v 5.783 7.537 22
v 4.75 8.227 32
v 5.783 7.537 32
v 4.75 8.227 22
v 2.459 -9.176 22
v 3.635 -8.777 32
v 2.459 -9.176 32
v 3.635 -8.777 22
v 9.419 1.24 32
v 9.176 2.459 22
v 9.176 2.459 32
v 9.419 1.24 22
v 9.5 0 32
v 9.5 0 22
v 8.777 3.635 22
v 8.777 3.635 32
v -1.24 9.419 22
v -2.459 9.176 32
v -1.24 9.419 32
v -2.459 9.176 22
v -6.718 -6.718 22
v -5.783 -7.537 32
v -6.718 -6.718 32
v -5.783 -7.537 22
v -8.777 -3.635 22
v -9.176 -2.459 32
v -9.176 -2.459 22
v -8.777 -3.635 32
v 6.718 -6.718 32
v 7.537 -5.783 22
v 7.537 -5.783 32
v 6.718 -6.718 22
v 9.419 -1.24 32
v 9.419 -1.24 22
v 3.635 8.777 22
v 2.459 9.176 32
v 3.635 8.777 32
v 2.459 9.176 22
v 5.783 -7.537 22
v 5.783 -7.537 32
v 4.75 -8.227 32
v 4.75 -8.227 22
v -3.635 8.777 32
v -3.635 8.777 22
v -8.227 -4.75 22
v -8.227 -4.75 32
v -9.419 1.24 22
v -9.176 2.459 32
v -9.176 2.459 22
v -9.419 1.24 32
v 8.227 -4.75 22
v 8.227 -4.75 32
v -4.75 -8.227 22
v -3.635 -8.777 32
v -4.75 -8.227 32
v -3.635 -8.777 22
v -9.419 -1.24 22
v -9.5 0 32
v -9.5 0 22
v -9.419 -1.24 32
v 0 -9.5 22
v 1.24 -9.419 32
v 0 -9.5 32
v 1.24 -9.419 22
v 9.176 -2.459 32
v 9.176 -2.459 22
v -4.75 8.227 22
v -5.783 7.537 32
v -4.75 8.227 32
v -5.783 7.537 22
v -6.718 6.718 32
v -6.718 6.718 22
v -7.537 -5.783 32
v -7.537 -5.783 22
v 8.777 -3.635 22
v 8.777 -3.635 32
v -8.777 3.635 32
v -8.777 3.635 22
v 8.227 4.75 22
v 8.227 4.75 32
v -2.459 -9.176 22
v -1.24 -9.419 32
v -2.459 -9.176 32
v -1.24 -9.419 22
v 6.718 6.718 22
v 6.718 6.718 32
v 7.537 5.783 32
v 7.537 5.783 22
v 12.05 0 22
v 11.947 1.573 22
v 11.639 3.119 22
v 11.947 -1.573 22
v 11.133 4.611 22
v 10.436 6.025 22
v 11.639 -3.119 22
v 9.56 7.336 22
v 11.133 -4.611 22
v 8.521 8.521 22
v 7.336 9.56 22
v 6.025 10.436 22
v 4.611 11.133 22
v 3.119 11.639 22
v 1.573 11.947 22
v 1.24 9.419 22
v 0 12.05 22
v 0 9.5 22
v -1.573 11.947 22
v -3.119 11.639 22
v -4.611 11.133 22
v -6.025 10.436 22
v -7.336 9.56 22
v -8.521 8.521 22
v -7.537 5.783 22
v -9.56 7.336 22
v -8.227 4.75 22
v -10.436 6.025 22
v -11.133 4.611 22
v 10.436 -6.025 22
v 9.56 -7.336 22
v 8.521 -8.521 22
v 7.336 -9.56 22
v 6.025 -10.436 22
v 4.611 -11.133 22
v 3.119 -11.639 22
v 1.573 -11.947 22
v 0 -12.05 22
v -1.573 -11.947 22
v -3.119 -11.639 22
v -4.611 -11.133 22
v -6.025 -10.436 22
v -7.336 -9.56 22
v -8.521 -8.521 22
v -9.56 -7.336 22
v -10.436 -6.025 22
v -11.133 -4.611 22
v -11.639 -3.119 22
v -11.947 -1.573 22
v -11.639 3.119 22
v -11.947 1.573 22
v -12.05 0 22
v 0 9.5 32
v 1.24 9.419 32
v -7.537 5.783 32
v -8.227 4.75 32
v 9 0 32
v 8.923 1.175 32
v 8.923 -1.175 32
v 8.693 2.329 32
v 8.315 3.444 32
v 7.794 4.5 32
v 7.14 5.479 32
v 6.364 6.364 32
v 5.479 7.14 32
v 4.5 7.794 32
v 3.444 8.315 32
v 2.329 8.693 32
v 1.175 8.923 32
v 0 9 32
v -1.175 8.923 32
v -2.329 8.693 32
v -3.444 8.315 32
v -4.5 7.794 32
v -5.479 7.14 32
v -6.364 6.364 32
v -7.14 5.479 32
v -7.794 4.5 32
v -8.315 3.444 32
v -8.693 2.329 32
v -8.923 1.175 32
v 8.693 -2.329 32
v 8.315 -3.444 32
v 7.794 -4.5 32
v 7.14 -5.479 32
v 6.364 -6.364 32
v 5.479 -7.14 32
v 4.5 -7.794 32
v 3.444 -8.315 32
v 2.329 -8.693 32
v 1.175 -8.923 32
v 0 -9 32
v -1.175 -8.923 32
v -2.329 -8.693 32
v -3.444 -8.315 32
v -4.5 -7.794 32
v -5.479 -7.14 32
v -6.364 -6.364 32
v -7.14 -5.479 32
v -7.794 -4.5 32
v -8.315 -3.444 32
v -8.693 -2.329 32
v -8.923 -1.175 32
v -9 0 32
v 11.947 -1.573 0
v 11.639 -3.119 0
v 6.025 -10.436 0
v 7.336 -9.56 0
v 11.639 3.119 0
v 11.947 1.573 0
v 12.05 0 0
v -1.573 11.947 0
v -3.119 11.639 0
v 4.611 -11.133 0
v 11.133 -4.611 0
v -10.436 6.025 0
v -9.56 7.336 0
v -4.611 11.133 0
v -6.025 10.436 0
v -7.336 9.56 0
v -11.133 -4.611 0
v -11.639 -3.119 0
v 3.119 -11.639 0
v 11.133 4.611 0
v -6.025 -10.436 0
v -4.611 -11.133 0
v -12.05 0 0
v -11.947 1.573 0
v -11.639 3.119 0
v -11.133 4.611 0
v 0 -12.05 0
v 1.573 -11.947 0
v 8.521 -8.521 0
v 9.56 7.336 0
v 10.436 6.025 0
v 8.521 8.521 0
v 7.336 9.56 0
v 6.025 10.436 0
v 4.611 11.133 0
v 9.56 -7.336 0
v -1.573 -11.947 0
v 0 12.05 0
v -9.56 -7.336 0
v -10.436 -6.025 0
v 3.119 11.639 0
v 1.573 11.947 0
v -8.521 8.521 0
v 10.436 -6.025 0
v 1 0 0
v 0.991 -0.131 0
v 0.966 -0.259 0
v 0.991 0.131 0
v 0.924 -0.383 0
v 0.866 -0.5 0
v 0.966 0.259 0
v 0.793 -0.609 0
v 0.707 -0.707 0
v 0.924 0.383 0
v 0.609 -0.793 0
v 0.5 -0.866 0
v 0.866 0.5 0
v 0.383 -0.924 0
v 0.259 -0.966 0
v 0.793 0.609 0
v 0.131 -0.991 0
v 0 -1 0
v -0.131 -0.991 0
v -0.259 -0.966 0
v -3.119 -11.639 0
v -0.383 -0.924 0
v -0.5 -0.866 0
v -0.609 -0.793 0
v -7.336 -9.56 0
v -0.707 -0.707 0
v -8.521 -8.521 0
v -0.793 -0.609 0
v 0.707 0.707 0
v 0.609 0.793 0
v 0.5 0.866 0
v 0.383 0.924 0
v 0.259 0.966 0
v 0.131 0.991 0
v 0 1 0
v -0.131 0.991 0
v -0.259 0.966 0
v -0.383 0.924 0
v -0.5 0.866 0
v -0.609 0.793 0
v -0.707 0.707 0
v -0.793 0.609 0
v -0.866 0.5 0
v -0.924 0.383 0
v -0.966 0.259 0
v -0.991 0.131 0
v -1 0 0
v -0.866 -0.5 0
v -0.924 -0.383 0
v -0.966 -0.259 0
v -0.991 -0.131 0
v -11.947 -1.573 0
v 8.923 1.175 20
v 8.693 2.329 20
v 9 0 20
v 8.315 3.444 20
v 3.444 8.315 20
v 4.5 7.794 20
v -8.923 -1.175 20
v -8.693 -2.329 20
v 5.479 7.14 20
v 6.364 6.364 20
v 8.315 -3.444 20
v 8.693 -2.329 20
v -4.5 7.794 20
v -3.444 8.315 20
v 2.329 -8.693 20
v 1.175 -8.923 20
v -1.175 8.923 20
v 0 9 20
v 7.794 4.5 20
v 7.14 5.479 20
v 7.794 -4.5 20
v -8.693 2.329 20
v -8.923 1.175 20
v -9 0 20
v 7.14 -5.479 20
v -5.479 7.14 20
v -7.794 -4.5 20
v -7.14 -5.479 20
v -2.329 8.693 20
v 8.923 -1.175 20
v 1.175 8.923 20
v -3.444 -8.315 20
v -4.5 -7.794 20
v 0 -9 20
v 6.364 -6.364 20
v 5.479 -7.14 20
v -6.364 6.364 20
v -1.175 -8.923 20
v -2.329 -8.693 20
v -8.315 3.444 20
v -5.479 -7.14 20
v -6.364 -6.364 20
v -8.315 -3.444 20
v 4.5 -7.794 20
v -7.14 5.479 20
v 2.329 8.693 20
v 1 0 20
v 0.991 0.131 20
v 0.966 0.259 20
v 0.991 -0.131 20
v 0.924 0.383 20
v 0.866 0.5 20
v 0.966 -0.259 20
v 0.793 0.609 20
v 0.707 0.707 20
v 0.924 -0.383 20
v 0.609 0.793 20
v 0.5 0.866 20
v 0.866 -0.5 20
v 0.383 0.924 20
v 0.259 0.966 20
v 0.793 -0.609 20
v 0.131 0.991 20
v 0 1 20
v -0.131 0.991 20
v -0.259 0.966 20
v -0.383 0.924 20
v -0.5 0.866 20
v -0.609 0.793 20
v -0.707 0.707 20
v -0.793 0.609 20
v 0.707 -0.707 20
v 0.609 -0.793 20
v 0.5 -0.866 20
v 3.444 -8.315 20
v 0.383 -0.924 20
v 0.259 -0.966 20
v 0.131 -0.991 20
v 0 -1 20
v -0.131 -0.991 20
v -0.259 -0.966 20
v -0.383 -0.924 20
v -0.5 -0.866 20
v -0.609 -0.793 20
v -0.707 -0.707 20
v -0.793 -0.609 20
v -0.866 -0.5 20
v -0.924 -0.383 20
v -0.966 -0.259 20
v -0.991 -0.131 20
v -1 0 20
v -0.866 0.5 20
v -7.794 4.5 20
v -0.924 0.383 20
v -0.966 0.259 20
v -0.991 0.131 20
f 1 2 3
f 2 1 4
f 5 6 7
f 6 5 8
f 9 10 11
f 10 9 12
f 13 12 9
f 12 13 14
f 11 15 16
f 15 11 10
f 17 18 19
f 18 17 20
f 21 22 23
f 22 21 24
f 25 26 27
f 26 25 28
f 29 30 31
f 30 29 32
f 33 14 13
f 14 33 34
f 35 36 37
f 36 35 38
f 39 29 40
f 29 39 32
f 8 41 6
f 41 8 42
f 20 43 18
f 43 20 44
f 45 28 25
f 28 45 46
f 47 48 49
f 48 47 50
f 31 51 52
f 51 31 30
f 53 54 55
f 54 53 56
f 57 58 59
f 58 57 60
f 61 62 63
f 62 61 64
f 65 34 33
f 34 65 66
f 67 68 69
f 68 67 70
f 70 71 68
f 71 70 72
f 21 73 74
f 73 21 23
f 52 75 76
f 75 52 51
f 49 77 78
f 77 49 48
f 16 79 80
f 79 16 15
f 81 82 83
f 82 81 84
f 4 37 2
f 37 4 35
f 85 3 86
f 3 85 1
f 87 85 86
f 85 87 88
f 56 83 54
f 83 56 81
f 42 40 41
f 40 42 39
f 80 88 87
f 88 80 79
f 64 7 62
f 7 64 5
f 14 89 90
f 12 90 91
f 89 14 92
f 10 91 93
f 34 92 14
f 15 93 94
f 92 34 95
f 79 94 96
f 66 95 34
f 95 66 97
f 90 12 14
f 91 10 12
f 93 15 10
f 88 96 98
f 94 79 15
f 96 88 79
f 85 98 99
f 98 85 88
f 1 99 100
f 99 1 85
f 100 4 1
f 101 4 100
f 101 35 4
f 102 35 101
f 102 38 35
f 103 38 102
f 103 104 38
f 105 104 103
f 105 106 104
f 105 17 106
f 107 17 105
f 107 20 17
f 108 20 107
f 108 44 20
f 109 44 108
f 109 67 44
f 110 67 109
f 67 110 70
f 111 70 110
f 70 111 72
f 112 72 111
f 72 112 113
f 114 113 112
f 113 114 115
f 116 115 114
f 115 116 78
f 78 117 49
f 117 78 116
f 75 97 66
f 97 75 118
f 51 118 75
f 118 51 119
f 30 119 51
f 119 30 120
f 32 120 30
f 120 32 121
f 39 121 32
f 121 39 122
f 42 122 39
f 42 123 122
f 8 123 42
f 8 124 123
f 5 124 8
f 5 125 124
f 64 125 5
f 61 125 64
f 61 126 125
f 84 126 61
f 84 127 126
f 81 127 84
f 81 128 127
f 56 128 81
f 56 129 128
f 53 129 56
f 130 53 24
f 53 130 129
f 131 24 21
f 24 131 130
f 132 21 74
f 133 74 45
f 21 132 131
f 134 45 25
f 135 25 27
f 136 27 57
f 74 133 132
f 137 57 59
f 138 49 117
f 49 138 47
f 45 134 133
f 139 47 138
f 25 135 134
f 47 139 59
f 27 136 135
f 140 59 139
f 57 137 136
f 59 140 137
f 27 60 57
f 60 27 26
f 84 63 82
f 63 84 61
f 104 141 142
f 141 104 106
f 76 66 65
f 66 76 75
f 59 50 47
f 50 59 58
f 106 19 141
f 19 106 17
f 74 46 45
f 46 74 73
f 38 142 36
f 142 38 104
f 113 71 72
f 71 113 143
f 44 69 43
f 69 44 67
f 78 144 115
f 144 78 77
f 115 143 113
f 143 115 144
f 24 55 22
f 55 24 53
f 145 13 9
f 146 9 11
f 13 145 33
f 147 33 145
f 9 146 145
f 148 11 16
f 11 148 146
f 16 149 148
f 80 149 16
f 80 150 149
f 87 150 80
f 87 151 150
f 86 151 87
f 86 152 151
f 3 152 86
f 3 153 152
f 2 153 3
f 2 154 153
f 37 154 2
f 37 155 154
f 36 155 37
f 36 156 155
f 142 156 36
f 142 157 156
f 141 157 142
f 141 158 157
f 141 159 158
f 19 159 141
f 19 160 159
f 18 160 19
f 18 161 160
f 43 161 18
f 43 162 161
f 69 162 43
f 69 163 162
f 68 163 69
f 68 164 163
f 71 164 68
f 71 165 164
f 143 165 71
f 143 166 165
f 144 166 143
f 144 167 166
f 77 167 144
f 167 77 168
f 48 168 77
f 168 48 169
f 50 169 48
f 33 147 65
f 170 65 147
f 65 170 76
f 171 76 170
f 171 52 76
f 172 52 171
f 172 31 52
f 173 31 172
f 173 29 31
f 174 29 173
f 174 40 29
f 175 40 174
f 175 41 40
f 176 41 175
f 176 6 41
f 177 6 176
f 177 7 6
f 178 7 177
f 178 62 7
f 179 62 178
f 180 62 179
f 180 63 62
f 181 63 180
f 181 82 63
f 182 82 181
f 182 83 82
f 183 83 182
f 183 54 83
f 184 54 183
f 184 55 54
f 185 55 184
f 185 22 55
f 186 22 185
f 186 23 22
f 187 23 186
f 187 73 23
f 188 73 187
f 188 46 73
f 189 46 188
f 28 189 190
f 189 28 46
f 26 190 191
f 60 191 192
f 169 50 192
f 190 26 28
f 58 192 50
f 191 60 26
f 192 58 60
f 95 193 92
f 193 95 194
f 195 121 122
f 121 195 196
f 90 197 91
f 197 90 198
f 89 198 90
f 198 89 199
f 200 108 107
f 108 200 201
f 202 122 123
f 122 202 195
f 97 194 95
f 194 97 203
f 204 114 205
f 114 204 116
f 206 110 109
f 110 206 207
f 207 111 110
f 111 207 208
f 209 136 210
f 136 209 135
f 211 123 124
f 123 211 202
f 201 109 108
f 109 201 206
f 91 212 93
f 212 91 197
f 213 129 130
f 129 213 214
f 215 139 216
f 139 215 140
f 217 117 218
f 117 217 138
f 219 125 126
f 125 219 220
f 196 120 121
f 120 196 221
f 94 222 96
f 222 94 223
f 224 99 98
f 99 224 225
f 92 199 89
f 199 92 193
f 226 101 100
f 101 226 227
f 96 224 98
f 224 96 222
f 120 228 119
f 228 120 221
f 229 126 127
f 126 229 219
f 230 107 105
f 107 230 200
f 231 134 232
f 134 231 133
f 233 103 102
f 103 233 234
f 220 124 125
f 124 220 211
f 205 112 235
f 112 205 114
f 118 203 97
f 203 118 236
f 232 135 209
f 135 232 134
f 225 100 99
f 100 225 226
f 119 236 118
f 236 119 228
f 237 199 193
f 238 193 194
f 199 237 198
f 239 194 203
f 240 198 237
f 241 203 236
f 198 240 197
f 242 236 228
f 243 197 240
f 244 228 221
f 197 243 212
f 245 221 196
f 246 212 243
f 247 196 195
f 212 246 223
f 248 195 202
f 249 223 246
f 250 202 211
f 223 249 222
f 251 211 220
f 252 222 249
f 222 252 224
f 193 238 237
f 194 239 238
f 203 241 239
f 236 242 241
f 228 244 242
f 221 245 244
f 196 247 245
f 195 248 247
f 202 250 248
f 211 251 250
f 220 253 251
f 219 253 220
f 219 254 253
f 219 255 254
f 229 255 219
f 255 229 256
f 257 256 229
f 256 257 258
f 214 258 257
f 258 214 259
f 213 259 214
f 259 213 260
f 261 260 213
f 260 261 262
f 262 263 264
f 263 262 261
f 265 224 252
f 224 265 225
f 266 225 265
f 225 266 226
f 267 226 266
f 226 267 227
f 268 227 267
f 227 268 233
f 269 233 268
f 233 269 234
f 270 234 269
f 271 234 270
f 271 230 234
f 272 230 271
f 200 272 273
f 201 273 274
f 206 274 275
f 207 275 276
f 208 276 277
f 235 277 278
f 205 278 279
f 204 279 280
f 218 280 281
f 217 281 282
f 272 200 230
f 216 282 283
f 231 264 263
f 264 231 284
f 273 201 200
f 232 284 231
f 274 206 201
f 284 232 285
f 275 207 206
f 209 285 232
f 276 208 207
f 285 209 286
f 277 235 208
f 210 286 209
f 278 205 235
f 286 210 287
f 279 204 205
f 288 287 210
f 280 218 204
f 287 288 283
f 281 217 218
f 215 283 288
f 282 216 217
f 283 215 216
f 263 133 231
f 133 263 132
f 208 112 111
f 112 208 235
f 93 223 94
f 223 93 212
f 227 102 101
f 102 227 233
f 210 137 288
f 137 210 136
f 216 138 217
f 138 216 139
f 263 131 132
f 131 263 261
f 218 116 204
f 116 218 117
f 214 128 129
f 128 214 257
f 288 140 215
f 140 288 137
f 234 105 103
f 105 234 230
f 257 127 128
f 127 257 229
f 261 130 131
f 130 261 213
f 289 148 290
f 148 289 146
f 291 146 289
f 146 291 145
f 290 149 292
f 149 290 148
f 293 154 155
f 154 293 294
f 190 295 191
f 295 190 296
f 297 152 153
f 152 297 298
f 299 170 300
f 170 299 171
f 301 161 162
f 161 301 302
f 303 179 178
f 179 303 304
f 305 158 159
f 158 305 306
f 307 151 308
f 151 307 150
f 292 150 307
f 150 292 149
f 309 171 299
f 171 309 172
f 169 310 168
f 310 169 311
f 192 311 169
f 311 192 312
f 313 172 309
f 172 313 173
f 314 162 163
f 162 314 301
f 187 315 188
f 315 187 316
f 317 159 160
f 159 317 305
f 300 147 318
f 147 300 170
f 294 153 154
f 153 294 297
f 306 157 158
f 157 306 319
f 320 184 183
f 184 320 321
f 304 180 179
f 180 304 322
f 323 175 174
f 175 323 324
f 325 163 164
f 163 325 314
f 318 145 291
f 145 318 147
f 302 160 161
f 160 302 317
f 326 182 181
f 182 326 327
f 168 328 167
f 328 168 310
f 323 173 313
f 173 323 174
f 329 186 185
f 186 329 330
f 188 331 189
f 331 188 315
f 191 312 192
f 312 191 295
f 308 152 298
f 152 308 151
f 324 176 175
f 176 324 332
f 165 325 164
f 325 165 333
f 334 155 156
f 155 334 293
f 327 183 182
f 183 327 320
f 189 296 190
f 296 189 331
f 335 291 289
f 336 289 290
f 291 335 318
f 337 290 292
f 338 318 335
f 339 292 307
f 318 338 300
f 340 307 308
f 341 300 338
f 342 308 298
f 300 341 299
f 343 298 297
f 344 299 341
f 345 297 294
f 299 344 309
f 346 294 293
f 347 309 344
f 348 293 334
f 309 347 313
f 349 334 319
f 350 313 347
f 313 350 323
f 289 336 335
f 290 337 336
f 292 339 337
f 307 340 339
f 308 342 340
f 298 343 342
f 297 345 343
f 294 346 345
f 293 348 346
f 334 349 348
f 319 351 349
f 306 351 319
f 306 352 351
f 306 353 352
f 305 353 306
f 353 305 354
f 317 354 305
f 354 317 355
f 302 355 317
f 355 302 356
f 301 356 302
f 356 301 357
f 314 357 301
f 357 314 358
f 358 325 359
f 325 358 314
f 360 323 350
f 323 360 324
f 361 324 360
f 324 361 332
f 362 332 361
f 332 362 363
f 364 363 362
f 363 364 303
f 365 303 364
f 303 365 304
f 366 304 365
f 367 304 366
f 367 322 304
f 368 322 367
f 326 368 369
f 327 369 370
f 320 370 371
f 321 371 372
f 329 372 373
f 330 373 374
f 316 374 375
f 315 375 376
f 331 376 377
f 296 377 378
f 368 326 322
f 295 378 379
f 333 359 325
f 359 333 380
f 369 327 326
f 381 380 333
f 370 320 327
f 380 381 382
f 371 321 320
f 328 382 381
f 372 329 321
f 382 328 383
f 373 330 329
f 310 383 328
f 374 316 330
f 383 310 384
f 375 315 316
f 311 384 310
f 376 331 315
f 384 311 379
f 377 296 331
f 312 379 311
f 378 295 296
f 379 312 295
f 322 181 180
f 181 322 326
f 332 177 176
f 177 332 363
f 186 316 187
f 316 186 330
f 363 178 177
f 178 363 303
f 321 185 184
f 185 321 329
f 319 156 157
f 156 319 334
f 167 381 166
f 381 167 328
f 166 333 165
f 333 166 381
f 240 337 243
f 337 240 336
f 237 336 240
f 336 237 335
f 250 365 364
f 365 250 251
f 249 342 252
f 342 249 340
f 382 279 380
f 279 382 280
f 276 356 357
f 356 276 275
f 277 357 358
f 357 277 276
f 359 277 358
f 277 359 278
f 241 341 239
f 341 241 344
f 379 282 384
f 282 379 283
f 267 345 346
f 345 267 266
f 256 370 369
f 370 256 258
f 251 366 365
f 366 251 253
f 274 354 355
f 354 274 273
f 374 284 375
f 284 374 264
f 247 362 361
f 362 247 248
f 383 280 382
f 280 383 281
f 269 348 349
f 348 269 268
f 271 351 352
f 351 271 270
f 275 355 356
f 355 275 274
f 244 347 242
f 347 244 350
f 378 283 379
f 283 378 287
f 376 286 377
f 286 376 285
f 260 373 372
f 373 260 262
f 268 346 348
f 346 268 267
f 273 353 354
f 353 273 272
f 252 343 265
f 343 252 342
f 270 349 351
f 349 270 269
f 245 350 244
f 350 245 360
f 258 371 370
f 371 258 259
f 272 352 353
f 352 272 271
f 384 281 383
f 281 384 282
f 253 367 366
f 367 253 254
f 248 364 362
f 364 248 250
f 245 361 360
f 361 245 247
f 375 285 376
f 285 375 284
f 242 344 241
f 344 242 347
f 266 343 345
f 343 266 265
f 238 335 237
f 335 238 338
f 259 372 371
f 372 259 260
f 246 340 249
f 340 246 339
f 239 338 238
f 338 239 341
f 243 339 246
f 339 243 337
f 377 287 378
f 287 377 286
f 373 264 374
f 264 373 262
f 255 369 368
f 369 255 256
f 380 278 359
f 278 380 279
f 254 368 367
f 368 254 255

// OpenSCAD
// Copyright 2017 Arthur Davis (thingiverse.com/artdavis)
// This file is licensed under a Creative Commons Attribution 4.0
// International License.
// THE SOFTWARE IS PROVIDED "AS IS", WITHOUT WARRANTY OF ANY KIND, EXPRESS OR
// IMPLIED, INCLUDING BUT NOT LIMITED TO THE WARRANTIES OF MERCHANTABILITY,
// FITNESS FOR A PARTICULAR PURPOSE AND NONINFRINGEMENT. IN NO EVENT SHALL THE
// AUTHORS OR COPYRIGHT HOLDERS BE LIABLE FOR ANY CLAIM, DAMAGES OR OTHER
// LIABILITY, WHETHER IN AN ACTION OF CONTRACT, TORT OR OTHERWISE, ARISING
// FROM, OUT OF OR IN CONNECTION WITH THE SOFTWARE OR THE USE OR OTHER
// DEALINGS IN THE SOFTWARE.
//
// A coupler that may be used to join a model rocket nose cone
// to the main body tube. This is especially useful for a split
// halves nosecone as in the Eggloft Egg Rocket Nose Cone here:
// http://www.thingiverse.com/thing:2228825
// The top setback portion is available area to tape the shoulder
// of the nosecond to this coupler. This length in combination
// with the length of the nosecone shoulder should be enough to
// accomodate the width of the tape that will be used.
// The hole in the bottom allows an eyelet to be screwed in to
// the coupler for tying to the shock cord.
//
// Estes body tube dimensions
// Ref: http://www.estesrockets.com
// Inner diameters:
// BT-5: 13.2mm
// BT-20: 18.0mm
// BT-50: 24.1mm
// BT-55: 32.6mm
// BT-60: 40.5mm
// Outer diameters:
// BT-5: 13.8mm
// BT-20: 18.7mm // set diam=19.3
// BT-50: 24.8mm // set diam=25.4
// BT-55: 34.0mm
// BT-60: 42.0mm

// Optimize view for Makerbot Customizer:
// preview[view:south east, tilt:top diagonal]

// Body Tube Inner Diameter
btid = 24.1; // [5:0.1:60]
// Coupling pocket inner diameter
pid = 18.0; // [5:0.1:60]
// Coupler coupling outer diameter
ccod = 19.0; // [5:0.1:60]
// Length of the whole coupling
length = 32.0; // [5:0.1:60]
// Diameter for eyelet screw hole
hole_diam = 2.0; // [0:0.1:10]
// Depth of coupling pocket
pocket = 12.0; // [0:0.1:60]
// Length of coupler coupling OD to expose
setback = 10.0; // [0:0.1:60]

/* [Hidden] */
// Special variables for facets/arcs
$fn = 48;
// Overlap offset for improved CSG operations
delta = 0.1;

difference() {
    difference() {
        union() {
            translate(v = [0, 0, length - setback]) {
                // Top of coupling
                cylinder(h=setback, d=ccod);
            }
            // Bottom of coupling
            cylinder(h = length - setback, d = btid);
        }

        // Coupling pocket
        translate(v = [0, 0, length - pocket]) {
            cylinder(h=pocket + delta, d = pid);
        }
    }
    // Eyelet screw hole
    cylinder(h = 2*(length + delta), d = hole_diam, center=true);
}
